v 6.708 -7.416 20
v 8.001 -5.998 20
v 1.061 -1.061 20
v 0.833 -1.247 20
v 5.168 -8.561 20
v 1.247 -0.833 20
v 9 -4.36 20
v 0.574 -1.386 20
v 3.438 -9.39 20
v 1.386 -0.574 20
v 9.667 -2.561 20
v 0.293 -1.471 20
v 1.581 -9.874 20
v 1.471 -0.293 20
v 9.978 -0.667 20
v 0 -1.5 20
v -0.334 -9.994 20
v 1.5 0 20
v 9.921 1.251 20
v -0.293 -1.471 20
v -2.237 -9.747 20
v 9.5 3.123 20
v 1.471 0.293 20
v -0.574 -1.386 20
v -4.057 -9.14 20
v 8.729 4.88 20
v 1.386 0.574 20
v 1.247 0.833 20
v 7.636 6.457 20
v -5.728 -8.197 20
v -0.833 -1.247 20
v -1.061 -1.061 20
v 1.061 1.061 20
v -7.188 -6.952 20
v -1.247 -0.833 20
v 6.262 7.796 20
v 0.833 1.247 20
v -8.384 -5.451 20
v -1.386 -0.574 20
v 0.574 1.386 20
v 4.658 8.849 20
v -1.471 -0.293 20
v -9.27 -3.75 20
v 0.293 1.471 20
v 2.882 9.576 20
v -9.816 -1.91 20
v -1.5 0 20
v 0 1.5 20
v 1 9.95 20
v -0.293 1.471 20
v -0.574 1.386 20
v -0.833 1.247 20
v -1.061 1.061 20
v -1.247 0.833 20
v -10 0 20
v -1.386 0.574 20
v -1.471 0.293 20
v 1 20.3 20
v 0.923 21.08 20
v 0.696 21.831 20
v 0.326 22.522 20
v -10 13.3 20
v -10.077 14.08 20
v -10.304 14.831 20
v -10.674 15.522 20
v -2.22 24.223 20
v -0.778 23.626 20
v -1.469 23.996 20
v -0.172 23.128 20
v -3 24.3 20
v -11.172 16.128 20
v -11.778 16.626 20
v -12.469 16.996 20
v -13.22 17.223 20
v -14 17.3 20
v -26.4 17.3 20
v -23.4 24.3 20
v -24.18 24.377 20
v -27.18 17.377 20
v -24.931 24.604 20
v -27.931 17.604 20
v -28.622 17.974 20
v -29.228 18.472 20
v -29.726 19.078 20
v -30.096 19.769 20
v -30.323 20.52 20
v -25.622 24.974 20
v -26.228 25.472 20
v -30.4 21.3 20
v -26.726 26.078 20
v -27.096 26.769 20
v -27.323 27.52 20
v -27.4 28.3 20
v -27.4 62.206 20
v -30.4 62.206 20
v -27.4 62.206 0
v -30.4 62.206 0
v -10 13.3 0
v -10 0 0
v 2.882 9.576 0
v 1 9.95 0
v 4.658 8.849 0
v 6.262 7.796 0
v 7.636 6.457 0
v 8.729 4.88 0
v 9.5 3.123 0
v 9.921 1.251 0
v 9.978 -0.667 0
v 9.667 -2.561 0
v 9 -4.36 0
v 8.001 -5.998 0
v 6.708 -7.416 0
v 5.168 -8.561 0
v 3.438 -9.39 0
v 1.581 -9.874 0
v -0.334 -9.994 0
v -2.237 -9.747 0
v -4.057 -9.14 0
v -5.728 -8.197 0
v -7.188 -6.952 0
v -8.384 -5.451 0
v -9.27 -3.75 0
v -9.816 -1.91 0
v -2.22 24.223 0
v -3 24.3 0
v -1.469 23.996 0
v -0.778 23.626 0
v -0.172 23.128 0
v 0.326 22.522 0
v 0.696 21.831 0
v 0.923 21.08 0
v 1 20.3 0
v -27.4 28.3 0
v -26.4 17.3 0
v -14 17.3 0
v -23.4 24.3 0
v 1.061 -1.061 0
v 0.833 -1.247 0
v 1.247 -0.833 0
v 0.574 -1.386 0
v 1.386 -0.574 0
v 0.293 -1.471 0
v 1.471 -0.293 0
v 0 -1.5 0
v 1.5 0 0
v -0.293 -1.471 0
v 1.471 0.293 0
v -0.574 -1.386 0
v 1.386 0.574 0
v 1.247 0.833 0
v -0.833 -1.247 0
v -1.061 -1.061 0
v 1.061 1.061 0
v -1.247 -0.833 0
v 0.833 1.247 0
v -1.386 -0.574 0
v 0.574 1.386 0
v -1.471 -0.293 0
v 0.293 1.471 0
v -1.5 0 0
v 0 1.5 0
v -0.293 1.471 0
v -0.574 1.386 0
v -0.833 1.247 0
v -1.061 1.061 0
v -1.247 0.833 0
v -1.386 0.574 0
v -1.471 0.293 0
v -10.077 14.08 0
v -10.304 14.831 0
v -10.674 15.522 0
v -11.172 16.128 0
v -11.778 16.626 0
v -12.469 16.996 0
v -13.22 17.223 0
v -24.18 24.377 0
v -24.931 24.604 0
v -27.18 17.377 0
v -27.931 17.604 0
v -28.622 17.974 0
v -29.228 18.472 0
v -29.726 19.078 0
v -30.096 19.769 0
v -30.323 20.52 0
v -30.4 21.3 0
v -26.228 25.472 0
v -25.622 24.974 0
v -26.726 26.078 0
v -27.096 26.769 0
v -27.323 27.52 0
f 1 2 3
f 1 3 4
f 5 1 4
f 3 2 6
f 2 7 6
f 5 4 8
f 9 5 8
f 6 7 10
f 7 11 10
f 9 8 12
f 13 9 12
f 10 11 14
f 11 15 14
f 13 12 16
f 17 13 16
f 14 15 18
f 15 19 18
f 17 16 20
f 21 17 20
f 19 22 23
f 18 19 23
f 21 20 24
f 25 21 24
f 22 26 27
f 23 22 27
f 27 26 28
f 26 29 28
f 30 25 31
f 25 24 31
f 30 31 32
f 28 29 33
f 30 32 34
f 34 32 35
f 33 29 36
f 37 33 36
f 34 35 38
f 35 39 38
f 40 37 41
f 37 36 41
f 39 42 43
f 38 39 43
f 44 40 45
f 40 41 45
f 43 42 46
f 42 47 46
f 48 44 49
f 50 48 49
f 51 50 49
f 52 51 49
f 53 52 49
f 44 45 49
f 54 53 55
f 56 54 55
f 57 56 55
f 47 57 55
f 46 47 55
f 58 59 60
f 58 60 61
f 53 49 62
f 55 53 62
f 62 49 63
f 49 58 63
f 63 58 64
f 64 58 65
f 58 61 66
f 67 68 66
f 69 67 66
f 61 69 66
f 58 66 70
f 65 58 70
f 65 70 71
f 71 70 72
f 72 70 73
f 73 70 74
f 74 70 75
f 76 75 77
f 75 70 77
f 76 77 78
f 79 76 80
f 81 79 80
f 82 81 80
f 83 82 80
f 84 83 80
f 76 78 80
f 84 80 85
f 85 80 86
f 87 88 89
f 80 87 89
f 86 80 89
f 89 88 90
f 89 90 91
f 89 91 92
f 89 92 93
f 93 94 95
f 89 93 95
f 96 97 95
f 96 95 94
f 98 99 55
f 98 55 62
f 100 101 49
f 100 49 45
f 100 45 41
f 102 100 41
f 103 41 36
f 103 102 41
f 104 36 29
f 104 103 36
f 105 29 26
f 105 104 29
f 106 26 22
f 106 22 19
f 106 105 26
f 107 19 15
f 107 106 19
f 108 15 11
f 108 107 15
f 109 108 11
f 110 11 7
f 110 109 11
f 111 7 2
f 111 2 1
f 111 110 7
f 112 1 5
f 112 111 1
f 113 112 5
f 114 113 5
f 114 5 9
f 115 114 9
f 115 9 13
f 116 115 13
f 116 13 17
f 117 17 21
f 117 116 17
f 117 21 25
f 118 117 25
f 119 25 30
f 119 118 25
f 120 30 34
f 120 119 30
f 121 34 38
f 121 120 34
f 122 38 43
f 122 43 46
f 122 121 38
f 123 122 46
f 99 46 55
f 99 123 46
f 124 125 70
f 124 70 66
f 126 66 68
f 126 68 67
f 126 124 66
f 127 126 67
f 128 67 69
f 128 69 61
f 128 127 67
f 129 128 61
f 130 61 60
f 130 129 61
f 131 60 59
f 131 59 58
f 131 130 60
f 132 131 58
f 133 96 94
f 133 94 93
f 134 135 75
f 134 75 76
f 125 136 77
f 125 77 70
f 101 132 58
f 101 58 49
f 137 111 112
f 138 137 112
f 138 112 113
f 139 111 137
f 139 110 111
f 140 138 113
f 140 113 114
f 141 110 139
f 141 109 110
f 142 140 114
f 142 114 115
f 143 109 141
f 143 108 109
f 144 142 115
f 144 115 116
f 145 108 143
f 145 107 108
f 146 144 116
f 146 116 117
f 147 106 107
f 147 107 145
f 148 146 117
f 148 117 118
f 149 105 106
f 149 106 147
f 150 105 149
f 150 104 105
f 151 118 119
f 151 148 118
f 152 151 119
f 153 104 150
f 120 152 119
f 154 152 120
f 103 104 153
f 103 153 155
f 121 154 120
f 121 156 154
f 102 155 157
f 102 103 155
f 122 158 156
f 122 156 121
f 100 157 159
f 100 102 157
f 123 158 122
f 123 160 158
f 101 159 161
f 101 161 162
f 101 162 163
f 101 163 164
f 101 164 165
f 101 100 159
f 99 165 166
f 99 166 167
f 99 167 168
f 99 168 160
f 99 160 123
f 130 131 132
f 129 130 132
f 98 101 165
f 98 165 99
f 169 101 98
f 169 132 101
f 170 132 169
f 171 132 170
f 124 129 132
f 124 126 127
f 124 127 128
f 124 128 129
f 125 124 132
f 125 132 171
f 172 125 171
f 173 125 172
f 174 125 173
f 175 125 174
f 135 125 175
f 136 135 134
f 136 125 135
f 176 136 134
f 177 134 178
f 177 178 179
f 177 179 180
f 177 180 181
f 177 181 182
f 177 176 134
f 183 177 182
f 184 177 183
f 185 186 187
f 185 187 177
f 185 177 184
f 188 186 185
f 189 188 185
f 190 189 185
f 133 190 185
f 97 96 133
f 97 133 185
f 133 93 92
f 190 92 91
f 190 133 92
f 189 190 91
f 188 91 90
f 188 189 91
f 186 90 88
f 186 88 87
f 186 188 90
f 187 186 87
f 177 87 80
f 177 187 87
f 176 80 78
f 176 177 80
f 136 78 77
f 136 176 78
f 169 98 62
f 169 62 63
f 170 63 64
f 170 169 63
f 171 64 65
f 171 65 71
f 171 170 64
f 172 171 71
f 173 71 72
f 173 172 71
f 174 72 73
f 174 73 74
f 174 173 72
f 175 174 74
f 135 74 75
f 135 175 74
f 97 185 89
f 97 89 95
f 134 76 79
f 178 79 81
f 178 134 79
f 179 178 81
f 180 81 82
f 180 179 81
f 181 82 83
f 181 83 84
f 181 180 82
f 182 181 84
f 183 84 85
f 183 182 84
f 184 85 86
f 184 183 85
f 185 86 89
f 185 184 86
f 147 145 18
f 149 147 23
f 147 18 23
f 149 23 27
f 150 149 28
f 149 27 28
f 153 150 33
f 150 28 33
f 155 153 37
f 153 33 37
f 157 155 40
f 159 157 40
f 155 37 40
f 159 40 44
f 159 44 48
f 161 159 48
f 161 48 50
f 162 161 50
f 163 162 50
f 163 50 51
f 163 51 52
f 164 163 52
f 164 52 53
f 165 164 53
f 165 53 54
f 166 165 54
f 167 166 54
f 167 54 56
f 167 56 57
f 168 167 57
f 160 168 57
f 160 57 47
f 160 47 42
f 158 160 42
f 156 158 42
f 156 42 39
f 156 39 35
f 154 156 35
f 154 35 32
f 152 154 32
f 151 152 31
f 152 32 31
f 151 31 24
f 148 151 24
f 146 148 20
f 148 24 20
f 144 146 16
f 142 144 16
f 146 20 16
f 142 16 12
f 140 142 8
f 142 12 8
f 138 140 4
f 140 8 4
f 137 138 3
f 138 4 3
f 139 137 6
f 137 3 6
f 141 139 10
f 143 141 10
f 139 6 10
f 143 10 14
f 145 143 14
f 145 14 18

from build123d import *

# Parameters (mm, degrees)
BOSS_EXTRUDE2_DEPTH = 20
SKETCH2_R           = 1.5
CUT_EXTRUDE1_DEPTH  = 30


with BuildPart() as part:
    # Sketch1 → Boss-Extrude2 (new body)
    with BuildSketch(Plane.XY):
        with BuildLine():
            Line((-14, 17.3), (-26.4, 17.3))
            ThreePointArc((-26.4, 17.3), (-29.228427125, 18.471572875), (-30.4, 21.3))
            Line((-30.4, 21.3), (-30.4, 62.205522081))
            Line((-30.4, 62.205522081), (-27.4, 62.205522081))
            Line((-27.4, 62.205522081), (-27.4, 28.3))
            ThreePointArc((-27.4, 28.3), (-26.228427125, 25.471572875), (-23.4, 24.3))
            Line((-23.4, 24.3), (-3, 24.3))
            ThreePointArc((-3, 24.3), (-0.171572875, 23.128427125), (1, 20.3))
            Line((1, 20.3), (1, 9.949874371))
            ThreePointArc((1, 9.949874371), (6.708203932, -7.416198487), (-10, 0))
            Line((-10, 0), (-10, 13.3))
            ThreePointArc((-10, 13.3), (-11.171572875, 16.128427125), (-14, 17.3))
        make_face()
    extrude(amount=BOSS_EXTRUDE2_DEPTH)

    # Sketch2 → Cut-Extrude1 (cut)
    with BuildSketch(Plane.XY.offset(20)):
        Circle(SKETCH2_R)
    extrude(amount=-CUT_EXTRUDE1_DEPTH, mode=Mode.SUBTRACT)


solid = part.part
